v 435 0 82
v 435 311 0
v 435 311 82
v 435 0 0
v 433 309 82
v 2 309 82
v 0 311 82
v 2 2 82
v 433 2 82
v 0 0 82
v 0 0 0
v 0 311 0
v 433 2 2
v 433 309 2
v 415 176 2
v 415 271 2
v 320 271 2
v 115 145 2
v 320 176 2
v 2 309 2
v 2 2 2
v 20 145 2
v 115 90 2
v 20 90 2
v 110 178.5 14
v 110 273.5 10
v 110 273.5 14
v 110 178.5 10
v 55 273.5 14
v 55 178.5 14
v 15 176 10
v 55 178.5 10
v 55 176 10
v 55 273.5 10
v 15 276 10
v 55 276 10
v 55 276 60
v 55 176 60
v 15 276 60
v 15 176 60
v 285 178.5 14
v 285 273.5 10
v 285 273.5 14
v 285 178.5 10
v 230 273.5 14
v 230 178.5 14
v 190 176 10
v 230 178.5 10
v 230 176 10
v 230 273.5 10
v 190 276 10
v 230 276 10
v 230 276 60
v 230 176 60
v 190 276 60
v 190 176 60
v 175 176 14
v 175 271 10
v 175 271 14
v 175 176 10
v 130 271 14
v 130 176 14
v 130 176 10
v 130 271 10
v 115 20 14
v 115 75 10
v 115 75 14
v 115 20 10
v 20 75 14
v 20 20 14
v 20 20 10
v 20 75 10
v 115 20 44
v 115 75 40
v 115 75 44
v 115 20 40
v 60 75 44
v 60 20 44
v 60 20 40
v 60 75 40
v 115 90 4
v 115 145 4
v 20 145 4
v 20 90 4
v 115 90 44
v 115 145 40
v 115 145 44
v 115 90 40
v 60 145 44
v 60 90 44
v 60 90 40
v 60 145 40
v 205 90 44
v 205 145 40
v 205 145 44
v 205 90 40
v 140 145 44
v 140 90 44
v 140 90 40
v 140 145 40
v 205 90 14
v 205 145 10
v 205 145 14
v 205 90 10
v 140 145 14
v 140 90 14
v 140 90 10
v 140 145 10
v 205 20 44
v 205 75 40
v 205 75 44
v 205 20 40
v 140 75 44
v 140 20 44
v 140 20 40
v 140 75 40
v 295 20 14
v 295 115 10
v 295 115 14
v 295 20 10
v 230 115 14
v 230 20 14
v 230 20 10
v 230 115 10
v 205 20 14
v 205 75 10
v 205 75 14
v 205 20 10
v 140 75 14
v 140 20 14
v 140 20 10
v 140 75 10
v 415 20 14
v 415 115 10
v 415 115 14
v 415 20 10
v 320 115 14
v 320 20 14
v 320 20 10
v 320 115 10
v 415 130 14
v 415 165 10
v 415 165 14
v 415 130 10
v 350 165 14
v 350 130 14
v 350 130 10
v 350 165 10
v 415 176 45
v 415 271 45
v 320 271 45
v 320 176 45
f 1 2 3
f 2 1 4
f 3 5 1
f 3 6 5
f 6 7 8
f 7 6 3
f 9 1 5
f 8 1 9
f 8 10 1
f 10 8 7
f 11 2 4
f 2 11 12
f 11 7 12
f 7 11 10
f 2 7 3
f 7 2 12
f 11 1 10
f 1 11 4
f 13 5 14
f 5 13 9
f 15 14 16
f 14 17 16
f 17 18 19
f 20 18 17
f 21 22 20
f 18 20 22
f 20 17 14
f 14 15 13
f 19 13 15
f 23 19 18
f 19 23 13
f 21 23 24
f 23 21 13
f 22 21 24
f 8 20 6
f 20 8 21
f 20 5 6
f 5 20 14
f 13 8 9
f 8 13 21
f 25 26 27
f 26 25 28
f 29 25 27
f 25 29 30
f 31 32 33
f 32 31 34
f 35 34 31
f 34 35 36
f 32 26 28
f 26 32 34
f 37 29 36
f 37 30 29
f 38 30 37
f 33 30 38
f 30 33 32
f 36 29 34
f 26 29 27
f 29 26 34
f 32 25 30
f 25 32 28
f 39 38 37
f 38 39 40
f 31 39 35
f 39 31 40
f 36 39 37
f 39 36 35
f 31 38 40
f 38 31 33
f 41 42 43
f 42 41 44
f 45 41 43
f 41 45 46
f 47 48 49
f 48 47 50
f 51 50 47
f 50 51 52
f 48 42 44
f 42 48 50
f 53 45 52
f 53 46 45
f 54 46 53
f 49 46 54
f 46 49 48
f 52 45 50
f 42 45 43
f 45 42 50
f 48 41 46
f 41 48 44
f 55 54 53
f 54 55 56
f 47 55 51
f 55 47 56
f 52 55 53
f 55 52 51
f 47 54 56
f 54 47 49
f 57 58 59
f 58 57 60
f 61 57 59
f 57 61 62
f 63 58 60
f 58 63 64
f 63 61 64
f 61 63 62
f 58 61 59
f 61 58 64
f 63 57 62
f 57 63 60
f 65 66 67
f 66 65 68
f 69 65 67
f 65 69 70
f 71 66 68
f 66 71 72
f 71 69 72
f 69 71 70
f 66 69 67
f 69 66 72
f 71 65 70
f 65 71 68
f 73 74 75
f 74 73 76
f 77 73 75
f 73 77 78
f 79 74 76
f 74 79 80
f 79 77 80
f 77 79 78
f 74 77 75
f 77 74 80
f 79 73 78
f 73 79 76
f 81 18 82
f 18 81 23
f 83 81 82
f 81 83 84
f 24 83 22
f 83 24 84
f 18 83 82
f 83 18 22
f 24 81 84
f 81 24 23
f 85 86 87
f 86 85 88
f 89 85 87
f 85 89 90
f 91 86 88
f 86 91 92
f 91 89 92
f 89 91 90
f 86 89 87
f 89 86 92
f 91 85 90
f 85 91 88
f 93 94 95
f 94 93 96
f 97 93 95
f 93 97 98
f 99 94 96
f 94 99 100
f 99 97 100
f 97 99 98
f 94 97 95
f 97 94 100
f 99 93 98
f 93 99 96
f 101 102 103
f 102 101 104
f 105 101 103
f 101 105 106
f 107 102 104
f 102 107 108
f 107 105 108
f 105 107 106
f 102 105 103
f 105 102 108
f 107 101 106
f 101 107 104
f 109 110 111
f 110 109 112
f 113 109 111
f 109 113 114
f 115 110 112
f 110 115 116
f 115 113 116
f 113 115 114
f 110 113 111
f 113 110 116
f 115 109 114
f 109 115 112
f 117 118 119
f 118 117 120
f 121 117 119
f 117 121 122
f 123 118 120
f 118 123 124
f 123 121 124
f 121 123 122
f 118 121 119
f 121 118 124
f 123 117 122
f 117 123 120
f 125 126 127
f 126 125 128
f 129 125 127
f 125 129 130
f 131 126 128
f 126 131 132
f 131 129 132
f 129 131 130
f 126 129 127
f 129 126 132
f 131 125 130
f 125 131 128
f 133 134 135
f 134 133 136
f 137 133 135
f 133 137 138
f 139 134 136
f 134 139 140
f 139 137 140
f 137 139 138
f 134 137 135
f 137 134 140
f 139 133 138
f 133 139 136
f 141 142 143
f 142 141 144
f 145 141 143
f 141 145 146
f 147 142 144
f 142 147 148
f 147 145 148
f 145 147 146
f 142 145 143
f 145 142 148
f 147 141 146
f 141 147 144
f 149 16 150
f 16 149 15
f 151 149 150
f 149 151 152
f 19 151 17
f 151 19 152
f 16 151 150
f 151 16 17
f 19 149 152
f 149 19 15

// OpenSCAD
width = 435;
height = 82;
depth = 311;

margin_lr = 20;


$fn = 64;


difference() {
  cube( [ width, depth, height ] );
            
  translate( [ 2, 2, 2 ] ) {
    cube( [ width - 4, depth - 4, height + 10 ] );
  }
}



// new channel left (blue)
translate( [ 15, depth - margin_lr - 115, 10 ] ) {
  translate( [ 40, 2.5, 0 ] ) {
      cube( [ 55, 95, 4 ] );
  }
  color( "blue" )
  cube( [ 40, 100, 50 ] );   
}

// new channel right (blue)
translate( [ 190, depth - margin_lr - 115, 10 ] ) {
  translate( [ 40, 2.5, 0 ] ) {
      cube( [ 55, 95, 4 ] );
  }
  color( "blue" )
  cube( [ 40, 100, 50 ] );    
}

// adau
translate( [ 130, depth - margin_lr - 115, 10 ] ) {
    color( "pink" )
  cube( [ 45, 95, 4 ] );   
}

// microprocessor
translate( [ margin_lr, margin_lr, 10 ] ) {
  color( "brown" )
  cube( [ 95, 55, 4 ] );   
}

// GPIO extender (pink)
translate( [ margin_lr + 40, margin_lr, 40 ] ) {
  color( "pink" )
  cube( [ 55, 55, 4 ] );   
}

// SPDIF (cyan)
translate( [ margin_lr, margin_lr + 70, 0 ] ) {
    color( "cyan" )
  cube( [ 95, 55, 4 ] );   
}

// DAC (orange)
translate( [ margin_lr + 40, margin_lr + 70, 40 ] ) {
  color( "orange" )
  cube( [ 55, 55, 4 ] );   
}


// subwoofer (magenta)
translate( [ 140, 90, 40 ] ) {
  color( "black" )
  cube( [ 65, 55, 4 ] );   
}


// channel sel (Yellow)
translate( [ 140, margin_lr + 70, 10 ] ) {
  color( "yellow" )
  cube( [ 65, 55, 4 ] );   
}

// vinyl (RED)
translate( [ 140, margin_lr, 40 ] ) {
  color( "red" )
  cube( [ 65, 55, 4 ] );   
}

// digital/ananlog power suppy
translate( [ 230, margin_lr, 10 ] ) {
  color( "Lavender" )
  cube( [ 65, 95, 4 ] );   
}
    
// FTDI
translate( [ 140, margin_lr, 10 ] ) {
  color( "purple" )
  cube( [ 65, 55, 4 ] );   
}
    

// power suppy
translate( [ width - margin_lr - 95, margin_lr, 10 ] ) {
  cube( [ 95, 95, 4 ] );   
}

// ground lift (green)
translate( [ width - margin_lr - 65, 130, 10 ] ) {
  color( "green" )
  cube( [ 65, 35, 4 ] );   
}


// toroid
translate( [ width - margin_lr - 95, depth - 135, 0 ] ) {
  cube( [ 95, 95, 45] );   
}
       
